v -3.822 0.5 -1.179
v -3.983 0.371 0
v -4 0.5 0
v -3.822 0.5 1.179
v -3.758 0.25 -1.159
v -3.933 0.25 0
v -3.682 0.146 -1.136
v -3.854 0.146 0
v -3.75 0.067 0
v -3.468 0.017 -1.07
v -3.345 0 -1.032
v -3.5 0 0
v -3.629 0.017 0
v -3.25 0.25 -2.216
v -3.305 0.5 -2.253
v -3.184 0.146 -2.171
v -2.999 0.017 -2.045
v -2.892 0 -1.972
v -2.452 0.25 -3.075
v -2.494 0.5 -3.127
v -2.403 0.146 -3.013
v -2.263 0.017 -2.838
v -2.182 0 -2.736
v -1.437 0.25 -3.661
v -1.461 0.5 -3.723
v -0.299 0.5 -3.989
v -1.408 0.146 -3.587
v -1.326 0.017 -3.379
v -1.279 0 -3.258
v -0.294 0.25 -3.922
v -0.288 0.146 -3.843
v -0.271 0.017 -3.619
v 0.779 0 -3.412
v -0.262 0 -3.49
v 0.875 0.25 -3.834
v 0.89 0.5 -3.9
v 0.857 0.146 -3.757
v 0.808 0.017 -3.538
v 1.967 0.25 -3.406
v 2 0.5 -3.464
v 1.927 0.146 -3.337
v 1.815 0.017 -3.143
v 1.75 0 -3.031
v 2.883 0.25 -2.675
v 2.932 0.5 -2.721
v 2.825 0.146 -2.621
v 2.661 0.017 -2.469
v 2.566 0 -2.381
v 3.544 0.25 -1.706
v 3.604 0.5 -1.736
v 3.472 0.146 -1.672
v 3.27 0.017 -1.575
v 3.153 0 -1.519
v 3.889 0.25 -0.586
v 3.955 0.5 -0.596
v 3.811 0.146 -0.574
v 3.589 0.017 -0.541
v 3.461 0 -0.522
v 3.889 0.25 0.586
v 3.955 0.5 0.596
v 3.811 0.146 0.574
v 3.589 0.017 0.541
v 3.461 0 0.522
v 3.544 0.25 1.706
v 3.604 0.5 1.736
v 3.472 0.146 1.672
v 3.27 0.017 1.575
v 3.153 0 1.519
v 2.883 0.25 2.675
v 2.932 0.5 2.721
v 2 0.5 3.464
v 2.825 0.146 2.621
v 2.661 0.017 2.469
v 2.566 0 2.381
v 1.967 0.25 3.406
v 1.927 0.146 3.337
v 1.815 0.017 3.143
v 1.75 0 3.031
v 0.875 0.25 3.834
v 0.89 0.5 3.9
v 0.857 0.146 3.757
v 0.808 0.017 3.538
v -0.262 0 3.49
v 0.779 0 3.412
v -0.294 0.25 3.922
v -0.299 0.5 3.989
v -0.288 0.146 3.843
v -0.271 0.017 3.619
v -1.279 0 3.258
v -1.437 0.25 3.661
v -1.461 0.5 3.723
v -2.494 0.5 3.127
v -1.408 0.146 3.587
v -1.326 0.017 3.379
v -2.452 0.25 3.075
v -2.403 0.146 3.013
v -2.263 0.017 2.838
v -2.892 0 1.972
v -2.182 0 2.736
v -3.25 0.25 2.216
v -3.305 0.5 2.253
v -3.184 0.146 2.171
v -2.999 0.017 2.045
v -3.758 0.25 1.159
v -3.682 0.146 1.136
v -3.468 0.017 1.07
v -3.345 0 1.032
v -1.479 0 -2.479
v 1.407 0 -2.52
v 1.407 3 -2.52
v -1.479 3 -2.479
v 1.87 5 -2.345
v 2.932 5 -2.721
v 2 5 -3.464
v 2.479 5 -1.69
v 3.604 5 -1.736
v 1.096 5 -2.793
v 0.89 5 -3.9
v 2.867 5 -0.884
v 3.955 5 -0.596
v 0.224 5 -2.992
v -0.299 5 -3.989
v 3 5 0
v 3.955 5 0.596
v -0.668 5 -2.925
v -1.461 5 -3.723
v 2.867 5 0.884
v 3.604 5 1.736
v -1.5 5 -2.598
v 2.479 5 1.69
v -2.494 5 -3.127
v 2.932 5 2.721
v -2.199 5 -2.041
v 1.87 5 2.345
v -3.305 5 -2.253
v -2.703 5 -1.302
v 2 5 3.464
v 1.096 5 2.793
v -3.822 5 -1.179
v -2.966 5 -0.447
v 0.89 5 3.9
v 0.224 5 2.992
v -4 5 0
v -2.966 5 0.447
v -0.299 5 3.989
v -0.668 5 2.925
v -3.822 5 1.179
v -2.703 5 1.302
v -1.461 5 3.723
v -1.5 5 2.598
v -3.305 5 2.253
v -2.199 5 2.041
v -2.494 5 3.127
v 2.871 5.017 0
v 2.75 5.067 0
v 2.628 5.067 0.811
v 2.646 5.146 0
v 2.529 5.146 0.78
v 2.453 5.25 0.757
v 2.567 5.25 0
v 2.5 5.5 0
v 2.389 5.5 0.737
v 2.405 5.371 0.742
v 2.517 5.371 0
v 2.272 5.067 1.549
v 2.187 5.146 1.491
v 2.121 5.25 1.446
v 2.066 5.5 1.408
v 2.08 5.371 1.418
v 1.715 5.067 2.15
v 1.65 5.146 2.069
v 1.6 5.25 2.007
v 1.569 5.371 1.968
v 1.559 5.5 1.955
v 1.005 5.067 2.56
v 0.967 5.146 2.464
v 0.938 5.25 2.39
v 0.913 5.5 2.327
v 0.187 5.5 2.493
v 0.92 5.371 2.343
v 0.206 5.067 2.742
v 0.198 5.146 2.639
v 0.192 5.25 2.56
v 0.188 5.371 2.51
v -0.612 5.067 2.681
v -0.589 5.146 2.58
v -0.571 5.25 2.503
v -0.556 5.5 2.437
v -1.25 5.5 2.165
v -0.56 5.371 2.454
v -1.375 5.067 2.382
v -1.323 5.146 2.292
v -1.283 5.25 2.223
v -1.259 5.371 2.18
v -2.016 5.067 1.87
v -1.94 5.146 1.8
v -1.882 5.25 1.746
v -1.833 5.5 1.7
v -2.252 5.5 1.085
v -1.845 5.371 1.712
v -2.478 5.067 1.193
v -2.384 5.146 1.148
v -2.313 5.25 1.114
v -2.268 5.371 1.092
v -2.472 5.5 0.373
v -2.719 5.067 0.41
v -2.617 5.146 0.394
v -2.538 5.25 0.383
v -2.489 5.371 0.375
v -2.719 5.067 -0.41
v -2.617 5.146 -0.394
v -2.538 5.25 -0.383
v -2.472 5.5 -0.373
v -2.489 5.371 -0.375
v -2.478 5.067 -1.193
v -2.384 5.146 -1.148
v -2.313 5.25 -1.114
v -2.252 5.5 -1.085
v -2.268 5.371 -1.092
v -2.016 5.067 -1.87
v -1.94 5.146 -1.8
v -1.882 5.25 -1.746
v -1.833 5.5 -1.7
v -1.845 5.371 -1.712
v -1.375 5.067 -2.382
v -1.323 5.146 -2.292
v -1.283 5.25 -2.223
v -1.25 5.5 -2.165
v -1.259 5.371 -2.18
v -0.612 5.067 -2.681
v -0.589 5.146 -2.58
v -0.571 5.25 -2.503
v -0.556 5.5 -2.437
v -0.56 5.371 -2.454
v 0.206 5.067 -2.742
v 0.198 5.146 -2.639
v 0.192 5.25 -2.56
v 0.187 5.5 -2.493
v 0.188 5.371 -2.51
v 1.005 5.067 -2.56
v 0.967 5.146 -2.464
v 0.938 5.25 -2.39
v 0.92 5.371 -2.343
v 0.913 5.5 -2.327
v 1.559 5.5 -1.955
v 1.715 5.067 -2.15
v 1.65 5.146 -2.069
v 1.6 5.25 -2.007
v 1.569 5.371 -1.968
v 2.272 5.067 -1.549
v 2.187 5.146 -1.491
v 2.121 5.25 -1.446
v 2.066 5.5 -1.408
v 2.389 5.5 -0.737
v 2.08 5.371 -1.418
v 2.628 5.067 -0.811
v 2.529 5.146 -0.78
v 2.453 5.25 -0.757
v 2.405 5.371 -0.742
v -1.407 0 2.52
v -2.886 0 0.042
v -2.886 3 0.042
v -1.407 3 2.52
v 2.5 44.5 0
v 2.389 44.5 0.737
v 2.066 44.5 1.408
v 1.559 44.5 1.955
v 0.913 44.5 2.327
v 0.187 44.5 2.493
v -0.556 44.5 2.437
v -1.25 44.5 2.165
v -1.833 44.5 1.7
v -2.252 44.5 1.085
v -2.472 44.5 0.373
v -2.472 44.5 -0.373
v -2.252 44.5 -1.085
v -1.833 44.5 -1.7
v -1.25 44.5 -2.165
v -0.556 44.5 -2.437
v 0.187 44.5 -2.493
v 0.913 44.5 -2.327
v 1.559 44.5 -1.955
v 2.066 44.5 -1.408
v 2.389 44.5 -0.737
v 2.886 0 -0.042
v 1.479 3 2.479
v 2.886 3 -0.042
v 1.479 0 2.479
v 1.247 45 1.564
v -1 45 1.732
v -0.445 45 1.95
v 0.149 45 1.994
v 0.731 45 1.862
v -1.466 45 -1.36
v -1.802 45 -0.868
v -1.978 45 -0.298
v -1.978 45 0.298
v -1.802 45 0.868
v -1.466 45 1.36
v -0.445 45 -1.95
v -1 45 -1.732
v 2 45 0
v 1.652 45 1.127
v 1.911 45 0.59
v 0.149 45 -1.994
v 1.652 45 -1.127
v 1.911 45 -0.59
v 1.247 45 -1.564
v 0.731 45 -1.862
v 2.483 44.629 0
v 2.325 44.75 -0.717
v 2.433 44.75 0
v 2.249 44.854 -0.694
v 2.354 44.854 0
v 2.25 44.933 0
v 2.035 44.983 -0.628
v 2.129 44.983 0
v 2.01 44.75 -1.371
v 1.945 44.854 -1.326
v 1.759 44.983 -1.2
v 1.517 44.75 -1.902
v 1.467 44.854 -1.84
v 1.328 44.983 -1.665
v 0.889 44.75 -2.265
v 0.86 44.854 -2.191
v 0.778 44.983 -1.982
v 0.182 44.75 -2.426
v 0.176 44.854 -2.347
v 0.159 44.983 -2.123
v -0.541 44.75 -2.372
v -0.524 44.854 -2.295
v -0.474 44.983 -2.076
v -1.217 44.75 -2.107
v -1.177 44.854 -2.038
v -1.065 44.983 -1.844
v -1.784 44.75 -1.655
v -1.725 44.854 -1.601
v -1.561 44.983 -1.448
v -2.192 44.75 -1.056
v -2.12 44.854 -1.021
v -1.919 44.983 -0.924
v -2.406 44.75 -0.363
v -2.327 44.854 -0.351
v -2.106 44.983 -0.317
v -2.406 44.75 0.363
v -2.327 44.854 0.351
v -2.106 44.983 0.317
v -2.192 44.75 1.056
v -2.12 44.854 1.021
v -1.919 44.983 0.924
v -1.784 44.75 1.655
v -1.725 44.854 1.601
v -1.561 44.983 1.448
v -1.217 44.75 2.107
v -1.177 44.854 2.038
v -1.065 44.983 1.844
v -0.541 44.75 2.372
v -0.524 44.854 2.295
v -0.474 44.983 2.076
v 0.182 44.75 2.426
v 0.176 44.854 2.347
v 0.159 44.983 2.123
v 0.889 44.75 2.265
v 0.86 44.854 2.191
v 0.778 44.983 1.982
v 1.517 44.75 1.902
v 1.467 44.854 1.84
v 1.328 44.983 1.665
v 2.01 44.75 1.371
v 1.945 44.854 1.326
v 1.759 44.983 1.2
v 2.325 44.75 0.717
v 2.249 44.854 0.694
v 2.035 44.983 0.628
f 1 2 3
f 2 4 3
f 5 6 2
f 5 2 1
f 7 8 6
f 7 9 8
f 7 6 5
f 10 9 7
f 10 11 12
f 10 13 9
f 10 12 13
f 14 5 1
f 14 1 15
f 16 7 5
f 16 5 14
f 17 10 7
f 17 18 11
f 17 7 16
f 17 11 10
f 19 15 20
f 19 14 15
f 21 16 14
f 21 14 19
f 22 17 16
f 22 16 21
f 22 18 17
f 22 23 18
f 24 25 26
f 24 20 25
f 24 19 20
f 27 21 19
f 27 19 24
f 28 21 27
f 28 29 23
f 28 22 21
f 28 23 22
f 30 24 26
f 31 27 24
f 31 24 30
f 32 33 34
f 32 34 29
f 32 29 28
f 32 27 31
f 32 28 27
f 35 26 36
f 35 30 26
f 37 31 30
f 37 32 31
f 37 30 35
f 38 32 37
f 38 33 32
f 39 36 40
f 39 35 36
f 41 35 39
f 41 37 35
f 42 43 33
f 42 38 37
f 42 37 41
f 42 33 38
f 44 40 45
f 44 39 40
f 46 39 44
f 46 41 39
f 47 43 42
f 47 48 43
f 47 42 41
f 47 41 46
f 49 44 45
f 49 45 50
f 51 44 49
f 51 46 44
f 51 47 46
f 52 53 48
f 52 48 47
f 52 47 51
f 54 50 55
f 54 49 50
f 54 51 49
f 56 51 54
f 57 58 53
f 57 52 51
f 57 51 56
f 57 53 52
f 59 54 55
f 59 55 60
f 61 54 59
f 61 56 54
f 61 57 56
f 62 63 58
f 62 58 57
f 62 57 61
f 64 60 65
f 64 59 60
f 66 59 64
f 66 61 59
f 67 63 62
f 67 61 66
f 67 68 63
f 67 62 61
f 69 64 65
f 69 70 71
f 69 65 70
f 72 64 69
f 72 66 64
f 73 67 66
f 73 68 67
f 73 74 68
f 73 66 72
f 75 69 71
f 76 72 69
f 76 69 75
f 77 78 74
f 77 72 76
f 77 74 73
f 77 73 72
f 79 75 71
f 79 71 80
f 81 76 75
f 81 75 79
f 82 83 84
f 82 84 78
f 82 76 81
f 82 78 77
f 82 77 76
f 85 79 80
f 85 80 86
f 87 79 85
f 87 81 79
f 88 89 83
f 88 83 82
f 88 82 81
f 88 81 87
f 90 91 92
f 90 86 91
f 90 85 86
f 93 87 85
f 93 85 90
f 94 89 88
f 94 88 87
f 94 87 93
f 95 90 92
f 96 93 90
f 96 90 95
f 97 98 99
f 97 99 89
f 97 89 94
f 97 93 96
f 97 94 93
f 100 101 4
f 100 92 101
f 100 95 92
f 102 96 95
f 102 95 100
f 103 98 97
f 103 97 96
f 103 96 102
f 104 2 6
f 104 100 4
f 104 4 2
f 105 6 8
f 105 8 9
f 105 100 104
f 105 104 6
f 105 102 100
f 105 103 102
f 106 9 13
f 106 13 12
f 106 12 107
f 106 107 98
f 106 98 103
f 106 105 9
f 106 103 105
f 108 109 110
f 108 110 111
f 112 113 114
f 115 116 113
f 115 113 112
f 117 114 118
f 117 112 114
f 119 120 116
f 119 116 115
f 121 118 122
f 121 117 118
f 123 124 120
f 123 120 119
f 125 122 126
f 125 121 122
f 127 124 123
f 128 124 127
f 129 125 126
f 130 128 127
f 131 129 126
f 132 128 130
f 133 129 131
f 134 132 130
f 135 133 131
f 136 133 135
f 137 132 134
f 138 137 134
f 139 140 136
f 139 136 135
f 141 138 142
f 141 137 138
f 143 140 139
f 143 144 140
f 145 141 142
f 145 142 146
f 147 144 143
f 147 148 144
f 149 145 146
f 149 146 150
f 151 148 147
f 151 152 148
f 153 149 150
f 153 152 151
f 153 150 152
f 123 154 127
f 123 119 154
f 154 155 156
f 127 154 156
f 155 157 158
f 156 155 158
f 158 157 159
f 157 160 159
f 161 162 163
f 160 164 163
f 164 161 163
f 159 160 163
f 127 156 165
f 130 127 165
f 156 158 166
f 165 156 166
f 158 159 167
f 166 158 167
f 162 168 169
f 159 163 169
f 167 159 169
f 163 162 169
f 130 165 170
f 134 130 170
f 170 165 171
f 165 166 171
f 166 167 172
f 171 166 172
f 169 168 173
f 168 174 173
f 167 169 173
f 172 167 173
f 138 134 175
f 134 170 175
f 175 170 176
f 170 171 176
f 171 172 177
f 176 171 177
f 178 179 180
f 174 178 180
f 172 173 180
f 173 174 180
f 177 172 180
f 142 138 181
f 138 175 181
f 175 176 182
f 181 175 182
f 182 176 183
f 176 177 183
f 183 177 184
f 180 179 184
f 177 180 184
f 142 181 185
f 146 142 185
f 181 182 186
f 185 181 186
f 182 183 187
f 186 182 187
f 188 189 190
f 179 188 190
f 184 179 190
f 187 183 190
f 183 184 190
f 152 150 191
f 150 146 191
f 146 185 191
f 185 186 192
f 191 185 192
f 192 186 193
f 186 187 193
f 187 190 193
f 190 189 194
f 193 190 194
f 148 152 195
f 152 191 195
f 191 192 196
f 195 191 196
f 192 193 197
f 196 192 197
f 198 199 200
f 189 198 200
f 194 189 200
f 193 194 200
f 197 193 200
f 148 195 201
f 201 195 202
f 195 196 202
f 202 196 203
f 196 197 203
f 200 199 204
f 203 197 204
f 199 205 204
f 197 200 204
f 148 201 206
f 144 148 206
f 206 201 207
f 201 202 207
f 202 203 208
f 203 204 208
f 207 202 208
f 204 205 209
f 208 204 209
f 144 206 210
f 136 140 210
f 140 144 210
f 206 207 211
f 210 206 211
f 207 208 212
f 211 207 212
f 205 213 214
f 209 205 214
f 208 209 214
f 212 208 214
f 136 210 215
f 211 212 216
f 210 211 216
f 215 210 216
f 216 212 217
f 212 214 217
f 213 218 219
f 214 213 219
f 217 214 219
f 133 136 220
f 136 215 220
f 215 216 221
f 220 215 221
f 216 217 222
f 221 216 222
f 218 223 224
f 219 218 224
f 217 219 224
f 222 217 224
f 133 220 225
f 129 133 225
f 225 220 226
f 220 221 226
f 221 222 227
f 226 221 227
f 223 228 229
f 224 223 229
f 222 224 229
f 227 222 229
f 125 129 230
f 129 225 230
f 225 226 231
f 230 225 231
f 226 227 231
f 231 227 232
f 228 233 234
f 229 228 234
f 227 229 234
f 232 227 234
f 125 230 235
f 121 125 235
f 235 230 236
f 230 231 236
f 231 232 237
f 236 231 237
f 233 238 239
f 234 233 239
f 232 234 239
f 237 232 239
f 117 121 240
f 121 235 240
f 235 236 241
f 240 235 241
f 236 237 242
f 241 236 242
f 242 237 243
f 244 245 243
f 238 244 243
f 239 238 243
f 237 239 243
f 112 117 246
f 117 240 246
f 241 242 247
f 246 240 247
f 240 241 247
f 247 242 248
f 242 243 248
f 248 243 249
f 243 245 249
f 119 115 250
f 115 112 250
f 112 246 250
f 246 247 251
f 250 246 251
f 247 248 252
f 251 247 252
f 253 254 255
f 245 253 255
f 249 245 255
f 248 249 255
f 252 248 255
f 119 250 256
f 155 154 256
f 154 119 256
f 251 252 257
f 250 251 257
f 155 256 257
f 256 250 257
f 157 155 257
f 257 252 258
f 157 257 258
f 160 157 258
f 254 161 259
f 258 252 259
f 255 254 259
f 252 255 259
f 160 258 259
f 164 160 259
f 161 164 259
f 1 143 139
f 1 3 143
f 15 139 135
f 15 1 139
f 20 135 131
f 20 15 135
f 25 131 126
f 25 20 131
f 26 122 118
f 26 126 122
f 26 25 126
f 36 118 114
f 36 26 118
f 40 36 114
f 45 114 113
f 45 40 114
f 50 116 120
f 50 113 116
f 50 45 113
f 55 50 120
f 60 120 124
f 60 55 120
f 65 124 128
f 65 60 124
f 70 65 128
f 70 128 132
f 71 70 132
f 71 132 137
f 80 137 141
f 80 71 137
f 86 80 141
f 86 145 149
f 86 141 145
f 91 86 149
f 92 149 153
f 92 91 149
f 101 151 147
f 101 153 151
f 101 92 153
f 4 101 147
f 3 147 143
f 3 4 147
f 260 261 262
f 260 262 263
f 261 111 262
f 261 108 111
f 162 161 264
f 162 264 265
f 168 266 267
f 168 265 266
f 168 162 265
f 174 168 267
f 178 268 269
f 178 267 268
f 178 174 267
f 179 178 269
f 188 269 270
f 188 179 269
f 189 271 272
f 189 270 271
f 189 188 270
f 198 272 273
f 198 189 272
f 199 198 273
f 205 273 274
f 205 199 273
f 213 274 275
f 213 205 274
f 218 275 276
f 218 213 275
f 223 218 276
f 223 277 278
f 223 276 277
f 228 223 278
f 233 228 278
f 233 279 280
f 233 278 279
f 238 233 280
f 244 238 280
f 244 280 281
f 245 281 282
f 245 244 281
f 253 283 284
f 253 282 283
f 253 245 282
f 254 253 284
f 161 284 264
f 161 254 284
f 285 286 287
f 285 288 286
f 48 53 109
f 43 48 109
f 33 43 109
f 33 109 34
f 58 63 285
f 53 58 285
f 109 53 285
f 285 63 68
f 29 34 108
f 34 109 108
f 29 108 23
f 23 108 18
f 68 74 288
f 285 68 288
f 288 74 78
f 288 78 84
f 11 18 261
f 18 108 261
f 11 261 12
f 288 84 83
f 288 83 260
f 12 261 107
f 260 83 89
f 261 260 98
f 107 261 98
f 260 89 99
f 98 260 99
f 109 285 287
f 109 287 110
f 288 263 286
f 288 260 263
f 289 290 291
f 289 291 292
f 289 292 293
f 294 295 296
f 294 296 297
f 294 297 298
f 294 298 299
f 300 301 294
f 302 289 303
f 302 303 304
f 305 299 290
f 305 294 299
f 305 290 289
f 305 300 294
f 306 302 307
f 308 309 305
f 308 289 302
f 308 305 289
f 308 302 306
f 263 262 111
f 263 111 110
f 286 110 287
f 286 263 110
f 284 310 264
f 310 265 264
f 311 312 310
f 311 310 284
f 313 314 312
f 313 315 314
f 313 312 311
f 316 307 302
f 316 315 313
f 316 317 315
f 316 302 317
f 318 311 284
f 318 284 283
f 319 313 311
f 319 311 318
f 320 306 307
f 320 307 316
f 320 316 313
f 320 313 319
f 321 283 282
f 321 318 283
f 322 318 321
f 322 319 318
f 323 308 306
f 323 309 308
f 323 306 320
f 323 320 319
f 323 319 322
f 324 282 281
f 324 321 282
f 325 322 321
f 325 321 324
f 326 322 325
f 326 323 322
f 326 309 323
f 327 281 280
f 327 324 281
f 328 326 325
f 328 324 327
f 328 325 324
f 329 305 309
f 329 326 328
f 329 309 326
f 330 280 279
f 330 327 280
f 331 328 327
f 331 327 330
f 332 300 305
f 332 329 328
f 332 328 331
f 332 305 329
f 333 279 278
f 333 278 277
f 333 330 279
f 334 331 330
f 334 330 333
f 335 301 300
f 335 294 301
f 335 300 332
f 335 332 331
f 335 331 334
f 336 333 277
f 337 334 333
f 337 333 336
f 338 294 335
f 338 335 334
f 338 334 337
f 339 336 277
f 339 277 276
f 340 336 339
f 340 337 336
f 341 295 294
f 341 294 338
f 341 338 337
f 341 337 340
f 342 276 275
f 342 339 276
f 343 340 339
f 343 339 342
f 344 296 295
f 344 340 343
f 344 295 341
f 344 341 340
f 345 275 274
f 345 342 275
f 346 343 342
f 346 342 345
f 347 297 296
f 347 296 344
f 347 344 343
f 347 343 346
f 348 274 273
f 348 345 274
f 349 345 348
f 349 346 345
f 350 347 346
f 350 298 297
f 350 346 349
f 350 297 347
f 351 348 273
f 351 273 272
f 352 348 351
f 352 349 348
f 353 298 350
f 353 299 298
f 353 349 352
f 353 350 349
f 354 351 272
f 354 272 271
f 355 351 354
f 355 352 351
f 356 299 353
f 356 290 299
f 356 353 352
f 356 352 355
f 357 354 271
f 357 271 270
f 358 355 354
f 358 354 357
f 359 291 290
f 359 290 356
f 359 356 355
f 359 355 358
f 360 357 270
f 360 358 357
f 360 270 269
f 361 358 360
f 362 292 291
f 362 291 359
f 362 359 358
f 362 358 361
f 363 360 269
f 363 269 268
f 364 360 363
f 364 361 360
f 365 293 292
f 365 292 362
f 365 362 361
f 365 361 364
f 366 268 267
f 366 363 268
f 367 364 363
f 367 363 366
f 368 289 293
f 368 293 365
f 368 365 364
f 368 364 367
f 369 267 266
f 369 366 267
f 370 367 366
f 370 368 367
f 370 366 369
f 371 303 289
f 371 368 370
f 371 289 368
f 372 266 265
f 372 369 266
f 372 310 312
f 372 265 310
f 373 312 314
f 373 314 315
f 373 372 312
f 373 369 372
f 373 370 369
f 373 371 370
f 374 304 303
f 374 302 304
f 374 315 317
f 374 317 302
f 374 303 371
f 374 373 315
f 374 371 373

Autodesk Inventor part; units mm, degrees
ref_plane "YZ Plane" through (0, 0, 0) normal (1, 0, 0) x (0, 1, 0)
ref_plane "XZ Plane" through (0, 0, 0) normal (0, 1, 0) x (-1, 0, 0)
ref_plane "XY Plane" through (0, 0, 0) normal (0, 0, 1) x (1, 0, 0)
sketch "Sketch1" plane through (0, 0, 0) normal (0, 1, 0) x (-1, 0, 0)
  circle A0 centre (0, 0) radius 4
  dimension "d0" = 8
extrude "Extrusion1" add sketch "Sketch1" along normal blind 5
sketch "Sketch2" plane through (0, 5, 0) normal (0, 1, 0) x (1, 0, 0)
  circle A0 centre (0, 0) radius 2.5
  dimension "d3" = 5
extrude "Extrusion2" add sketch "Sketch2" along normal blind 40
sketch "Sketch3" plane through (0, 0, 0) normal (0, -1, 0) x (1, 0, 0)
  line L0 (2.8865, -0.0416) -> (1.4072, -2.5205)
  line L1 (1.4072, -2.5205) -> (-1.4792, -2.479)
  line L2 (-1.4792, -2.479) -> (-2.8865, 0.0416)
  line L3 (-2.8865, 0.0416) -> (-1.4072, 2.5205)
  line L4 (-1.4072, 2.5205) -> (1.4792, 2.479)
  line L5 (1.4792, 2.479) -> (2.8865, -0.0416)
  point P0 (0, 0)
  point P1 (0, 0)
  dimension "d6" = 2.5
extrude "Extrusion3" cut sketch "Sketch3" against normal blind 3
fillet "Fillet1" radius 0.5 1 edges at (4, 0, 0)
fillet "Fillet2" radius 0.5 2 edges at (-2.5, 5, 0) (-2.5, 45, 0)
properties part number "bulong5mmdai50"
